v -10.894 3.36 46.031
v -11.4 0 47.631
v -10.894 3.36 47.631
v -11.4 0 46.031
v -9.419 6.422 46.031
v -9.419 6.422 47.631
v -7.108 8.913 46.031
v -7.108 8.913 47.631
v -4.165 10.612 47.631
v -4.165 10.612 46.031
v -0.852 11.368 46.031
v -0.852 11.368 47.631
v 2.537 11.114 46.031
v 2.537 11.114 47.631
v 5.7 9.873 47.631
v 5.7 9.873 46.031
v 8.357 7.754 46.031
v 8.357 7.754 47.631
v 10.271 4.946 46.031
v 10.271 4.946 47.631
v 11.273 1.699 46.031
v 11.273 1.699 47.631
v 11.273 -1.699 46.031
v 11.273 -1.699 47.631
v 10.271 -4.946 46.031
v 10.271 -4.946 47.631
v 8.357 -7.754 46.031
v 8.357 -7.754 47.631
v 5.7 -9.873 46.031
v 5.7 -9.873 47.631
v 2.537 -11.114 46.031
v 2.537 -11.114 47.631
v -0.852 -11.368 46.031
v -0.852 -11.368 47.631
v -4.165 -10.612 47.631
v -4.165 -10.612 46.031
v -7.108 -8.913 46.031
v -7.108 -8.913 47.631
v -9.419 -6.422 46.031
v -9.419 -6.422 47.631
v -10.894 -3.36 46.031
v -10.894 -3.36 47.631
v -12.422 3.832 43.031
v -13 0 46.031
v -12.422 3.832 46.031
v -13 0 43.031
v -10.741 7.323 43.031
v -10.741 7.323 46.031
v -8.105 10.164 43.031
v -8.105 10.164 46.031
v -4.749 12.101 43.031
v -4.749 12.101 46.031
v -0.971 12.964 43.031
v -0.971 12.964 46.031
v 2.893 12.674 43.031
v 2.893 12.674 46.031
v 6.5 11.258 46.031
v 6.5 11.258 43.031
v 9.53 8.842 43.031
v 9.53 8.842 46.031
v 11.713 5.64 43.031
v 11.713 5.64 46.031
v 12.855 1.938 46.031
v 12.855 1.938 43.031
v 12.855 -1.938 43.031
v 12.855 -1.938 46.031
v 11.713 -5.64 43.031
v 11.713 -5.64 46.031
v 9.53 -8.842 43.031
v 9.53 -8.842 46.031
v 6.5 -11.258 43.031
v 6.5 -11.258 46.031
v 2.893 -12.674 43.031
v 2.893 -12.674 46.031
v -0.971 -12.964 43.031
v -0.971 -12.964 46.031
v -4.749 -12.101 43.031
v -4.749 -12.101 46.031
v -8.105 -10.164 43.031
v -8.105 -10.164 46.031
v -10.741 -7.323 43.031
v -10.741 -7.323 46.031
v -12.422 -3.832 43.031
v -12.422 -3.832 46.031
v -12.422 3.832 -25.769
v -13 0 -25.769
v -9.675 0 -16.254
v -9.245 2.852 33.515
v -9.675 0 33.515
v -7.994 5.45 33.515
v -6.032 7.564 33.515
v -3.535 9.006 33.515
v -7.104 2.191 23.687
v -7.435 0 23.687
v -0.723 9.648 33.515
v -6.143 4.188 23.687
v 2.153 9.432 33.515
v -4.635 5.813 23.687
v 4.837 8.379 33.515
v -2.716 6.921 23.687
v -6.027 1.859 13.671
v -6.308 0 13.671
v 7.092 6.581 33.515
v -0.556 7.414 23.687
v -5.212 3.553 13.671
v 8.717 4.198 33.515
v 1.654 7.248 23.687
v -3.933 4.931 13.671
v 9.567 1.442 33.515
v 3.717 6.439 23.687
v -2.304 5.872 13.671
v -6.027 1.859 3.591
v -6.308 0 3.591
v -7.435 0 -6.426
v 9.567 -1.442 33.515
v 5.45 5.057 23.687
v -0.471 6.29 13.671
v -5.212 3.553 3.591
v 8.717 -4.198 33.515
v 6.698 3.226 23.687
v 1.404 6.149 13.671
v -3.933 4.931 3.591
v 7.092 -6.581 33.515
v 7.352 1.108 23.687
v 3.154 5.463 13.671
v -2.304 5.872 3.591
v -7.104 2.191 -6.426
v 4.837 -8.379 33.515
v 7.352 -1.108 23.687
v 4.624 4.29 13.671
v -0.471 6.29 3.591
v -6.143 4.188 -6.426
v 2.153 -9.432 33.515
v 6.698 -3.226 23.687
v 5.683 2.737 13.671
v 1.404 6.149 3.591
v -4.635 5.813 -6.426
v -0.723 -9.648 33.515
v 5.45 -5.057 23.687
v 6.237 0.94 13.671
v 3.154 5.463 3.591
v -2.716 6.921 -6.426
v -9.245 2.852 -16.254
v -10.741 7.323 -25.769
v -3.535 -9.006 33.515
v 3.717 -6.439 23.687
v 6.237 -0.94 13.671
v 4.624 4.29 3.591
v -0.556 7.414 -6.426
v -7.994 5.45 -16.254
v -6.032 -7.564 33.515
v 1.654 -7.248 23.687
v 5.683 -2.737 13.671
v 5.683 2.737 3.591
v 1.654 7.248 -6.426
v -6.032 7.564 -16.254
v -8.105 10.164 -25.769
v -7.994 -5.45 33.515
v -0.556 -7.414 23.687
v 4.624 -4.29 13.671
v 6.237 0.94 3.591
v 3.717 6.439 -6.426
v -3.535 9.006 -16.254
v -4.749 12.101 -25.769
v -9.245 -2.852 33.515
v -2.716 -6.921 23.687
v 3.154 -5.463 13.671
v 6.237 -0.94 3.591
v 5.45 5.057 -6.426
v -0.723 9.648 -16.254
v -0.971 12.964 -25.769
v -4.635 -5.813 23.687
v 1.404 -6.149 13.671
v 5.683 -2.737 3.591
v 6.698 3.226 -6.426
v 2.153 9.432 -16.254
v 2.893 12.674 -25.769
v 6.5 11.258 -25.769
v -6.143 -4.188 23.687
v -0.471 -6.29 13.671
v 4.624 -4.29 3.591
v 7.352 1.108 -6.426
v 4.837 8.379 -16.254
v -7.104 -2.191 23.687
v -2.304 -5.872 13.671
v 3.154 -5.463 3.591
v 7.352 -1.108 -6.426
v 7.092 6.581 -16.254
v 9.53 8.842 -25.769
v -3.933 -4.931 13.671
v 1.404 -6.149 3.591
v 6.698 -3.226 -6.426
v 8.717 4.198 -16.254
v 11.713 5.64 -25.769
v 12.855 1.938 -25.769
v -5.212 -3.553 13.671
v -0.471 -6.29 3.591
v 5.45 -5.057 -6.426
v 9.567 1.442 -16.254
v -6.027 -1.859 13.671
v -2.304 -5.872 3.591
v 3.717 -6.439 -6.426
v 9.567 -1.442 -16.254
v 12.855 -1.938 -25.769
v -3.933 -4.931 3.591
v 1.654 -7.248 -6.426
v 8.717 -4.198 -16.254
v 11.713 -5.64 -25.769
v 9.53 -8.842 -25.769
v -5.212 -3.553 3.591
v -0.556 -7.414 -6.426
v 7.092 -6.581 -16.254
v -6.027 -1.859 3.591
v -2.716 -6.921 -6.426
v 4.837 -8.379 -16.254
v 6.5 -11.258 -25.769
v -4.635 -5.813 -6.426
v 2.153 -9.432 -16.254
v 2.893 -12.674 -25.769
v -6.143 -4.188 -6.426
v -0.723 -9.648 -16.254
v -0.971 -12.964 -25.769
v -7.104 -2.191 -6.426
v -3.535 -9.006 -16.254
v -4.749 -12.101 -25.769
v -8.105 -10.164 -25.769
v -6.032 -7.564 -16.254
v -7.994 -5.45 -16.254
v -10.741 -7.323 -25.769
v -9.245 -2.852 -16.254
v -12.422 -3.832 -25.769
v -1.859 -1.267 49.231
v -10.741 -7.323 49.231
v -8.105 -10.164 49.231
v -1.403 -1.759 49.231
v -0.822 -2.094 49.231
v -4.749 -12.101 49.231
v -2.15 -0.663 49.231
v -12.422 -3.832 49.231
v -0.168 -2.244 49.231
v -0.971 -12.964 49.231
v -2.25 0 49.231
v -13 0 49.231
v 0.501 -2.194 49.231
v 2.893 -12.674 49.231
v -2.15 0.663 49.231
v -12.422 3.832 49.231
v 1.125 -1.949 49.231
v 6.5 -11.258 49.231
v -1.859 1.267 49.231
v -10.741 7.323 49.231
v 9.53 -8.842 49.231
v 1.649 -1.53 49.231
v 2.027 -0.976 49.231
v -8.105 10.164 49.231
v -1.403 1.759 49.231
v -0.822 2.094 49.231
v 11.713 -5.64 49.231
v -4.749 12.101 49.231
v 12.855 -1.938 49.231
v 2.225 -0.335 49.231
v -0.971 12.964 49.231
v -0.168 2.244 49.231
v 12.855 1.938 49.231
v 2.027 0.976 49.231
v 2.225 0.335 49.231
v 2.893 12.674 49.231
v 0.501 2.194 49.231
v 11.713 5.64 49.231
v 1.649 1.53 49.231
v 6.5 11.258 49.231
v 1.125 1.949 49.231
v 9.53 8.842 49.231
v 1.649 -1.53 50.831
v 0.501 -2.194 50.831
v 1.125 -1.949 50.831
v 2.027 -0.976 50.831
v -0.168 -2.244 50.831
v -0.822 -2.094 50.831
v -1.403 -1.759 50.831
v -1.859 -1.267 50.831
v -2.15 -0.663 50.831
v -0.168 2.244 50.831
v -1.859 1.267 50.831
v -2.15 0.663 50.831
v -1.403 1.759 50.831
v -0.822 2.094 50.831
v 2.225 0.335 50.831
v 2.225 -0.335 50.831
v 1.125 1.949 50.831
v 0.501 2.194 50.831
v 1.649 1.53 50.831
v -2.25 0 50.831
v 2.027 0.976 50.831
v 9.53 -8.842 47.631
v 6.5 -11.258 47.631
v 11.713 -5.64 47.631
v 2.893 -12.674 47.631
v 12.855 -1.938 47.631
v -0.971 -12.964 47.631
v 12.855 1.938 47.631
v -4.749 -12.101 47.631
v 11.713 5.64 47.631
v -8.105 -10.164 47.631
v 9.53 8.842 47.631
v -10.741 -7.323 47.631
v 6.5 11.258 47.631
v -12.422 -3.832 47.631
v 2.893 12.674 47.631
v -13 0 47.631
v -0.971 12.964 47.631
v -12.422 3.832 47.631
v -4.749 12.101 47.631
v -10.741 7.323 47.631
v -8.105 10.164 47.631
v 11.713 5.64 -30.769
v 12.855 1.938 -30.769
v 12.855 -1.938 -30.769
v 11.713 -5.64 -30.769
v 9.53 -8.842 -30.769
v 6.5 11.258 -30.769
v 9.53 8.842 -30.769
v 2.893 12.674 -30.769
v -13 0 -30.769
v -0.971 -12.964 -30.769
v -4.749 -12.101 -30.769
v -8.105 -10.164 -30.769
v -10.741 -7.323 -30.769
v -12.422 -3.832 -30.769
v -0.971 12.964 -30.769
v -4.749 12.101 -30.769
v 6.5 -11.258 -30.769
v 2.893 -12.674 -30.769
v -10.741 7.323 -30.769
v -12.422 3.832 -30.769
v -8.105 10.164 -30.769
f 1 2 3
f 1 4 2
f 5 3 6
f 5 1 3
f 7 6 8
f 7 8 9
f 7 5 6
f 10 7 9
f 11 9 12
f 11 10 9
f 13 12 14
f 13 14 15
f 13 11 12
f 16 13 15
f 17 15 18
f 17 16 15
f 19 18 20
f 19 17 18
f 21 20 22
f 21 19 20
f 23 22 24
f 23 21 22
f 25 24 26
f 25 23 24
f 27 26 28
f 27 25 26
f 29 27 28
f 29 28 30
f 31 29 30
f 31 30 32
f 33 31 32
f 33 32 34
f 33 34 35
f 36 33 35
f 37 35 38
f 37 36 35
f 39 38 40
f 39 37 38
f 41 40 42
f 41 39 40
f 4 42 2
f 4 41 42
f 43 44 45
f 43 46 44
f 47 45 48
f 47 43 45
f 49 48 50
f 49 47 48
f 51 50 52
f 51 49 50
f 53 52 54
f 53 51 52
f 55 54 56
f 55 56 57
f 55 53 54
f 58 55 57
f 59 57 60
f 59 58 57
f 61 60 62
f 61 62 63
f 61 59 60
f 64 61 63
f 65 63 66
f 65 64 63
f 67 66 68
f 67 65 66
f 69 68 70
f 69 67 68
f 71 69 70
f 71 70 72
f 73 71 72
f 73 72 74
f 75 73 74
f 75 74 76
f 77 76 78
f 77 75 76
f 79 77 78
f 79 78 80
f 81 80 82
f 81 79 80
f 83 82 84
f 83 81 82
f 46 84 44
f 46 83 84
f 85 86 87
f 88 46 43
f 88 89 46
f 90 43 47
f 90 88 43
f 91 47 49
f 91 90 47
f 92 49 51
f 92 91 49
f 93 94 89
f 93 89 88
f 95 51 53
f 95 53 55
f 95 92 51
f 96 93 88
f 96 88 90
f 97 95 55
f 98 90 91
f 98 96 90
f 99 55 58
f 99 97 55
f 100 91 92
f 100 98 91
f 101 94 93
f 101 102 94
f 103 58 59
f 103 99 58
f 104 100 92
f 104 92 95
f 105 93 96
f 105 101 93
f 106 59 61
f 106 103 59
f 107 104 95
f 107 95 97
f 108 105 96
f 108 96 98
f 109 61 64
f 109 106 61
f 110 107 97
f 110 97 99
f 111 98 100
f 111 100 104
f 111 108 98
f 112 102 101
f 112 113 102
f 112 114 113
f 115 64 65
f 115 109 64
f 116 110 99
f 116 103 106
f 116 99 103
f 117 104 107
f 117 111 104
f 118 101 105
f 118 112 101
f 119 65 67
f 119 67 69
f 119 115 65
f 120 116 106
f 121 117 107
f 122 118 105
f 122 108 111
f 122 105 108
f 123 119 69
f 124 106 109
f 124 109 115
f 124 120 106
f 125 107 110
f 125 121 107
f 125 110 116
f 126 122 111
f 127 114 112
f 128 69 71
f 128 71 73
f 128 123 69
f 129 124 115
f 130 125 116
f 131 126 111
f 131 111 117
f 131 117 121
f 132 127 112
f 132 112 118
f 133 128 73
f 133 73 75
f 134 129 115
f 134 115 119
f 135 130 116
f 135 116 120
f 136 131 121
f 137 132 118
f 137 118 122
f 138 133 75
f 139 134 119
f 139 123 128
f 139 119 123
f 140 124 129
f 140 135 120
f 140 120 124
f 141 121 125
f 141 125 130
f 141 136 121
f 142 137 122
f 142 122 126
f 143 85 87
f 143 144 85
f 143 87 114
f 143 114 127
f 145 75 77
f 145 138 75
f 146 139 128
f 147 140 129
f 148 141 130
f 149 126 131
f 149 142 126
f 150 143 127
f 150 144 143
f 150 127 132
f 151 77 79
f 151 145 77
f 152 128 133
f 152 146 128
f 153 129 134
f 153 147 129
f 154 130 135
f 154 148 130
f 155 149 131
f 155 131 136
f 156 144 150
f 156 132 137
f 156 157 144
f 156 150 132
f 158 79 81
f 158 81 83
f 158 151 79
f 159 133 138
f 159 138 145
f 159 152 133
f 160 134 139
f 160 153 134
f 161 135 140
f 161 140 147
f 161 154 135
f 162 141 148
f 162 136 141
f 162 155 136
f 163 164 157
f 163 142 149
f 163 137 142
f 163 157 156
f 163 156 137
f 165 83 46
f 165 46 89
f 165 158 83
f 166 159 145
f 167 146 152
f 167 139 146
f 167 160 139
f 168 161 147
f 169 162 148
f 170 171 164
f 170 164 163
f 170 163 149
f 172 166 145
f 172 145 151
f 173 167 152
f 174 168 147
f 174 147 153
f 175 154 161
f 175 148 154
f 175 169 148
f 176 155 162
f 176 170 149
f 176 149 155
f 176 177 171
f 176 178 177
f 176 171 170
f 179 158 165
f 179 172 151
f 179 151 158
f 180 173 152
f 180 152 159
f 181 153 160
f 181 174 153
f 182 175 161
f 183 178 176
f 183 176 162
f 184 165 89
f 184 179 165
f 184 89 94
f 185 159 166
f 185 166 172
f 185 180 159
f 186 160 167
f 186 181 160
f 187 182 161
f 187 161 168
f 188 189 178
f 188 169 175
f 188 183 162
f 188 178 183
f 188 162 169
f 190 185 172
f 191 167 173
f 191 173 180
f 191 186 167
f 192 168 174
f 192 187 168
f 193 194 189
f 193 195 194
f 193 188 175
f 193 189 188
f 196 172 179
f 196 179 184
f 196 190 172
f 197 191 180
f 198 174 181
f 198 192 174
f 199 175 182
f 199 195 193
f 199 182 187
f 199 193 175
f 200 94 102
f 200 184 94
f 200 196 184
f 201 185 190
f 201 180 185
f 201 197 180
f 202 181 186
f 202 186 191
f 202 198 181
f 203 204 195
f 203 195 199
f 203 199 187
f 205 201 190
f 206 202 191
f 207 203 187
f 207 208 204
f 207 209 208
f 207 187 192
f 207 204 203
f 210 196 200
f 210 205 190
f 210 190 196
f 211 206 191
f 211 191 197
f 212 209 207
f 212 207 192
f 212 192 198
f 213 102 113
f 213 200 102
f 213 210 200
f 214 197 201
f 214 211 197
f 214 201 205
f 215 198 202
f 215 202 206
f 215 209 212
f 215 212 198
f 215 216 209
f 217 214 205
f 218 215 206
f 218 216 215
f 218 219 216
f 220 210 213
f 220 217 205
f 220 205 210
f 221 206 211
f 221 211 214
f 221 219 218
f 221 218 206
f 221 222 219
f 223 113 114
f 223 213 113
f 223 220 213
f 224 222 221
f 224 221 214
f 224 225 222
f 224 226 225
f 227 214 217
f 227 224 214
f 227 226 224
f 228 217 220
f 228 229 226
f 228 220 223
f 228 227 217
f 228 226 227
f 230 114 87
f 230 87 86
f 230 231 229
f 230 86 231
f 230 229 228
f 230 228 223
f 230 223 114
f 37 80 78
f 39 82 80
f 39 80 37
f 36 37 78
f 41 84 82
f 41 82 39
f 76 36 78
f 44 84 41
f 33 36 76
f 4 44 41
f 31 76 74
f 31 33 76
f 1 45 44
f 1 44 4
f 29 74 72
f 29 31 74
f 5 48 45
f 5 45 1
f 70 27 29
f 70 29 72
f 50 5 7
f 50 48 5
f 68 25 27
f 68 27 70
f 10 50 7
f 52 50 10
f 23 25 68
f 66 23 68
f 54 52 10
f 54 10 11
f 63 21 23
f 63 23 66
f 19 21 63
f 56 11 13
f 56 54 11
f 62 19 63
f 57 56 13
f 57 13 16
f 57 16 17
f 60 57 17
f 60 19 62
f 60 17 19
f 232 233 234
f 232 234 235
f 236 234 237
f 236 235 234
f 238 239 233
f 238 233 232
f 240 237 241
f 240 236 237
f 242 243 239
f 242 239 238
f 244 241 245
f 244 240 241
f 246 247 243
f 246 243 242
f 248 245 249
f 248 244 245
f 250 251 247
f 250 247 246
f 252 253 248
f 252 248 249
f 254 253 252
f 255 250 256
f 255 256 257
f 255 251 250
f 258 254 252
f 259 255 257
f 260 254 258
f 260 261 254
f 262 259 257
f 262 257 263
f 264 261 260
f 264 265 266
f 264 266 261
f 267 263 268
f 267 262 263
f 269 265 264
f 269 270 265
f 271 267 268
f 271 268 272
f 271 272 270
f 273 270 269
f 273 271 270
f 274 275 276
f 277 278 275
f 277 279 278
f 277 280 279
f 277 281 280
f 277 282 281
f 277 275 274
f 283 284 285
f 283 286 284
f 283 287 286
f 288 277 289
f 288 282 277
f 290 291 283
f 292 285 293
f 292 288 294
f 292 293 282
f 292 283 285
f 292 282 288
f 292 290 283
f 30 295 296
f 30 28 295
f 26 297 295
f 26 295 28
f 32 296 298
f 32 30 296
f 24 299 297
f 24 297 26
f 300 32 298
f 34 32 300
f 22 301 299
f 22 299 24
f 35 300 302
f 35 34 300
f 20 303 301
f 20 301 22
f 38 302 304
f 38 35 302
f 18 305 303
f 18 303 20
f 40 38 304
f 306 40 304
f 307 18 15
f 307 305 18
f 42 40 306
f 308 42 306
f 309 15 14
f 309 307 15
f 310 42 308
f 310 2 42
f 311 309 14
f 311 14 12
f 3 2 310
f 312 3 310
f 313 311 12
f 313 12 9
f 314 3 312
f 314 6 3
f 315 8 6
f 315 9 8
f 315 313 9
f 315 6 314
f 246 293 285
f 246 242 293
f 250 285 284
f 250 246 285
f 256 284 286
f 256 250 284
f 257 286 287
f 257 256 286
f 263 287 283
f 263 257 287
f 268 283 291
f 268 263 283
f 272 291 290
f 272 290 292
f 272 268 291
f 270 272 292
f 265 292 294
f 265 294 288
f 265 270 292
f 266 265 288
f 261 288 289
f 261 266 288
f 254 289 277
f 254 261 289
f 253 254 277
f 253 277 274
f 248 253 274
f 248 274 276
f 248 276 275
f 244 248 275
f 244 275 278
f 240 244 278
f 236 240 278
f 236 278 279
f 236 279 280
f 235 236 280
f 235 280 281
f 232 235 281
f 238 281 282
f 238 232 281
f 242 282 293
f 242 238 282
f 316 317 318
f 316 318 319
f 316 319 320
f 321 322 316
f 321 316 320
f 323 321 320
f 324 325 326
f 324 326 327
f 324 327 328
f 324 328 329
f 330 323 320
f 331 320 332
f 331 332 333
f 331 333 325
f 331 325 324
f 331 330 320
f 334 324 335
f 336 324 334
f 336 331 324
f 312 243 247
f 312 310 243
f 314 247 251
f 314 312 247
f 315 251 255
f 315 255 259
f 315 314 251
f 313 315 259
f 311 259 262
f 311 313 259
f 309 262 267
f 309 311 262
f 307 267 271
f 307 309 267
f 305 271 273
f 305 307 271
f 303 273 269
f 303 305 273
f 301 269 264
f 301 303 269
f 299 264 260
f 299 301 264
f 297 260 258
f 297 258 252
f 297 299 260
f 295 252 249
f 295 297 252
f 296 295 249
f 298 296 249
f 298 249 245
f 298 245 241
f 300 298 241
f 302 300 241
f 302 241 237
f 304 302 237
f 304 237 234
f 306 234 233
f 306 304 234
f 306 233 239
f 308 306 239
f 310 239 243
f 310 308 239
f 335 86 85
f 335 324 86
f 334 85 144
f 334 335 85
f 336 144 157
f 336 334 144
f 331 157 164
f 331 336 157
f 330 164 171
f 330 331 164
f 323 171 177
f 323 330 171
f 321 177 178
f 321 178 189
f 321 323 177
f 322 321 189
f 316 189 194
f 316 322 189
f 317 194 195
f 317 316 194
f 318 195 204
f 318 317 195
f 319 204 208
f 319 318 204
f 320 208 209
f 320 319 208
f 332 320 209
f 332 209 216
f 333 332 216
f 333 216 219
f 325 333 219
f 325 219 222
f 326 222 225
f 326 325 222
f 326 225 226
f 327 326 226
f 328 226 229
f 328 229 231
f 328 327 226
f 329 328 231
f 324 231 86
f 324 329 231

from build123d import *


with BuildPart() as f1:
    # F0 (on Front) → F1 (revolve)
    with BuildSketch(Plane.XZ):
        with BuildLine():
            Line((-2.25, 49.230757), (-13, 49.230757))
            Line((-13, 49.230757), (-13, 47.630757))
            Line((-13, 47.630757), (-11.4, 47.630757))
            Line((-11.4, 47.630757), (-11.4, 46.030757))
            Line((-11.4, 46.030757), (-13, 46.030757))
            Line((-13, 46.030757), (-13, 43.030757))
            ThreePointArc((-13, 43.030757), (-6.166339, 8.630757), (-13, -25.769243))
            Line((-13, -25.769243), (-13, -30.769243))
            Line((-13, -30.769243), (0, -30.769243))
            Line((0, -30.769243), (0, 50.830757))
            Line((0, 50.830757), (-2.25, 50.830757))
            Line((-2.25, 50.830757), (-2.25, 49.230757))
        make_face()
    revolve(axis=Axis((0, 0, 10.030757), (0, 0, -1)))


solid = f1.part
